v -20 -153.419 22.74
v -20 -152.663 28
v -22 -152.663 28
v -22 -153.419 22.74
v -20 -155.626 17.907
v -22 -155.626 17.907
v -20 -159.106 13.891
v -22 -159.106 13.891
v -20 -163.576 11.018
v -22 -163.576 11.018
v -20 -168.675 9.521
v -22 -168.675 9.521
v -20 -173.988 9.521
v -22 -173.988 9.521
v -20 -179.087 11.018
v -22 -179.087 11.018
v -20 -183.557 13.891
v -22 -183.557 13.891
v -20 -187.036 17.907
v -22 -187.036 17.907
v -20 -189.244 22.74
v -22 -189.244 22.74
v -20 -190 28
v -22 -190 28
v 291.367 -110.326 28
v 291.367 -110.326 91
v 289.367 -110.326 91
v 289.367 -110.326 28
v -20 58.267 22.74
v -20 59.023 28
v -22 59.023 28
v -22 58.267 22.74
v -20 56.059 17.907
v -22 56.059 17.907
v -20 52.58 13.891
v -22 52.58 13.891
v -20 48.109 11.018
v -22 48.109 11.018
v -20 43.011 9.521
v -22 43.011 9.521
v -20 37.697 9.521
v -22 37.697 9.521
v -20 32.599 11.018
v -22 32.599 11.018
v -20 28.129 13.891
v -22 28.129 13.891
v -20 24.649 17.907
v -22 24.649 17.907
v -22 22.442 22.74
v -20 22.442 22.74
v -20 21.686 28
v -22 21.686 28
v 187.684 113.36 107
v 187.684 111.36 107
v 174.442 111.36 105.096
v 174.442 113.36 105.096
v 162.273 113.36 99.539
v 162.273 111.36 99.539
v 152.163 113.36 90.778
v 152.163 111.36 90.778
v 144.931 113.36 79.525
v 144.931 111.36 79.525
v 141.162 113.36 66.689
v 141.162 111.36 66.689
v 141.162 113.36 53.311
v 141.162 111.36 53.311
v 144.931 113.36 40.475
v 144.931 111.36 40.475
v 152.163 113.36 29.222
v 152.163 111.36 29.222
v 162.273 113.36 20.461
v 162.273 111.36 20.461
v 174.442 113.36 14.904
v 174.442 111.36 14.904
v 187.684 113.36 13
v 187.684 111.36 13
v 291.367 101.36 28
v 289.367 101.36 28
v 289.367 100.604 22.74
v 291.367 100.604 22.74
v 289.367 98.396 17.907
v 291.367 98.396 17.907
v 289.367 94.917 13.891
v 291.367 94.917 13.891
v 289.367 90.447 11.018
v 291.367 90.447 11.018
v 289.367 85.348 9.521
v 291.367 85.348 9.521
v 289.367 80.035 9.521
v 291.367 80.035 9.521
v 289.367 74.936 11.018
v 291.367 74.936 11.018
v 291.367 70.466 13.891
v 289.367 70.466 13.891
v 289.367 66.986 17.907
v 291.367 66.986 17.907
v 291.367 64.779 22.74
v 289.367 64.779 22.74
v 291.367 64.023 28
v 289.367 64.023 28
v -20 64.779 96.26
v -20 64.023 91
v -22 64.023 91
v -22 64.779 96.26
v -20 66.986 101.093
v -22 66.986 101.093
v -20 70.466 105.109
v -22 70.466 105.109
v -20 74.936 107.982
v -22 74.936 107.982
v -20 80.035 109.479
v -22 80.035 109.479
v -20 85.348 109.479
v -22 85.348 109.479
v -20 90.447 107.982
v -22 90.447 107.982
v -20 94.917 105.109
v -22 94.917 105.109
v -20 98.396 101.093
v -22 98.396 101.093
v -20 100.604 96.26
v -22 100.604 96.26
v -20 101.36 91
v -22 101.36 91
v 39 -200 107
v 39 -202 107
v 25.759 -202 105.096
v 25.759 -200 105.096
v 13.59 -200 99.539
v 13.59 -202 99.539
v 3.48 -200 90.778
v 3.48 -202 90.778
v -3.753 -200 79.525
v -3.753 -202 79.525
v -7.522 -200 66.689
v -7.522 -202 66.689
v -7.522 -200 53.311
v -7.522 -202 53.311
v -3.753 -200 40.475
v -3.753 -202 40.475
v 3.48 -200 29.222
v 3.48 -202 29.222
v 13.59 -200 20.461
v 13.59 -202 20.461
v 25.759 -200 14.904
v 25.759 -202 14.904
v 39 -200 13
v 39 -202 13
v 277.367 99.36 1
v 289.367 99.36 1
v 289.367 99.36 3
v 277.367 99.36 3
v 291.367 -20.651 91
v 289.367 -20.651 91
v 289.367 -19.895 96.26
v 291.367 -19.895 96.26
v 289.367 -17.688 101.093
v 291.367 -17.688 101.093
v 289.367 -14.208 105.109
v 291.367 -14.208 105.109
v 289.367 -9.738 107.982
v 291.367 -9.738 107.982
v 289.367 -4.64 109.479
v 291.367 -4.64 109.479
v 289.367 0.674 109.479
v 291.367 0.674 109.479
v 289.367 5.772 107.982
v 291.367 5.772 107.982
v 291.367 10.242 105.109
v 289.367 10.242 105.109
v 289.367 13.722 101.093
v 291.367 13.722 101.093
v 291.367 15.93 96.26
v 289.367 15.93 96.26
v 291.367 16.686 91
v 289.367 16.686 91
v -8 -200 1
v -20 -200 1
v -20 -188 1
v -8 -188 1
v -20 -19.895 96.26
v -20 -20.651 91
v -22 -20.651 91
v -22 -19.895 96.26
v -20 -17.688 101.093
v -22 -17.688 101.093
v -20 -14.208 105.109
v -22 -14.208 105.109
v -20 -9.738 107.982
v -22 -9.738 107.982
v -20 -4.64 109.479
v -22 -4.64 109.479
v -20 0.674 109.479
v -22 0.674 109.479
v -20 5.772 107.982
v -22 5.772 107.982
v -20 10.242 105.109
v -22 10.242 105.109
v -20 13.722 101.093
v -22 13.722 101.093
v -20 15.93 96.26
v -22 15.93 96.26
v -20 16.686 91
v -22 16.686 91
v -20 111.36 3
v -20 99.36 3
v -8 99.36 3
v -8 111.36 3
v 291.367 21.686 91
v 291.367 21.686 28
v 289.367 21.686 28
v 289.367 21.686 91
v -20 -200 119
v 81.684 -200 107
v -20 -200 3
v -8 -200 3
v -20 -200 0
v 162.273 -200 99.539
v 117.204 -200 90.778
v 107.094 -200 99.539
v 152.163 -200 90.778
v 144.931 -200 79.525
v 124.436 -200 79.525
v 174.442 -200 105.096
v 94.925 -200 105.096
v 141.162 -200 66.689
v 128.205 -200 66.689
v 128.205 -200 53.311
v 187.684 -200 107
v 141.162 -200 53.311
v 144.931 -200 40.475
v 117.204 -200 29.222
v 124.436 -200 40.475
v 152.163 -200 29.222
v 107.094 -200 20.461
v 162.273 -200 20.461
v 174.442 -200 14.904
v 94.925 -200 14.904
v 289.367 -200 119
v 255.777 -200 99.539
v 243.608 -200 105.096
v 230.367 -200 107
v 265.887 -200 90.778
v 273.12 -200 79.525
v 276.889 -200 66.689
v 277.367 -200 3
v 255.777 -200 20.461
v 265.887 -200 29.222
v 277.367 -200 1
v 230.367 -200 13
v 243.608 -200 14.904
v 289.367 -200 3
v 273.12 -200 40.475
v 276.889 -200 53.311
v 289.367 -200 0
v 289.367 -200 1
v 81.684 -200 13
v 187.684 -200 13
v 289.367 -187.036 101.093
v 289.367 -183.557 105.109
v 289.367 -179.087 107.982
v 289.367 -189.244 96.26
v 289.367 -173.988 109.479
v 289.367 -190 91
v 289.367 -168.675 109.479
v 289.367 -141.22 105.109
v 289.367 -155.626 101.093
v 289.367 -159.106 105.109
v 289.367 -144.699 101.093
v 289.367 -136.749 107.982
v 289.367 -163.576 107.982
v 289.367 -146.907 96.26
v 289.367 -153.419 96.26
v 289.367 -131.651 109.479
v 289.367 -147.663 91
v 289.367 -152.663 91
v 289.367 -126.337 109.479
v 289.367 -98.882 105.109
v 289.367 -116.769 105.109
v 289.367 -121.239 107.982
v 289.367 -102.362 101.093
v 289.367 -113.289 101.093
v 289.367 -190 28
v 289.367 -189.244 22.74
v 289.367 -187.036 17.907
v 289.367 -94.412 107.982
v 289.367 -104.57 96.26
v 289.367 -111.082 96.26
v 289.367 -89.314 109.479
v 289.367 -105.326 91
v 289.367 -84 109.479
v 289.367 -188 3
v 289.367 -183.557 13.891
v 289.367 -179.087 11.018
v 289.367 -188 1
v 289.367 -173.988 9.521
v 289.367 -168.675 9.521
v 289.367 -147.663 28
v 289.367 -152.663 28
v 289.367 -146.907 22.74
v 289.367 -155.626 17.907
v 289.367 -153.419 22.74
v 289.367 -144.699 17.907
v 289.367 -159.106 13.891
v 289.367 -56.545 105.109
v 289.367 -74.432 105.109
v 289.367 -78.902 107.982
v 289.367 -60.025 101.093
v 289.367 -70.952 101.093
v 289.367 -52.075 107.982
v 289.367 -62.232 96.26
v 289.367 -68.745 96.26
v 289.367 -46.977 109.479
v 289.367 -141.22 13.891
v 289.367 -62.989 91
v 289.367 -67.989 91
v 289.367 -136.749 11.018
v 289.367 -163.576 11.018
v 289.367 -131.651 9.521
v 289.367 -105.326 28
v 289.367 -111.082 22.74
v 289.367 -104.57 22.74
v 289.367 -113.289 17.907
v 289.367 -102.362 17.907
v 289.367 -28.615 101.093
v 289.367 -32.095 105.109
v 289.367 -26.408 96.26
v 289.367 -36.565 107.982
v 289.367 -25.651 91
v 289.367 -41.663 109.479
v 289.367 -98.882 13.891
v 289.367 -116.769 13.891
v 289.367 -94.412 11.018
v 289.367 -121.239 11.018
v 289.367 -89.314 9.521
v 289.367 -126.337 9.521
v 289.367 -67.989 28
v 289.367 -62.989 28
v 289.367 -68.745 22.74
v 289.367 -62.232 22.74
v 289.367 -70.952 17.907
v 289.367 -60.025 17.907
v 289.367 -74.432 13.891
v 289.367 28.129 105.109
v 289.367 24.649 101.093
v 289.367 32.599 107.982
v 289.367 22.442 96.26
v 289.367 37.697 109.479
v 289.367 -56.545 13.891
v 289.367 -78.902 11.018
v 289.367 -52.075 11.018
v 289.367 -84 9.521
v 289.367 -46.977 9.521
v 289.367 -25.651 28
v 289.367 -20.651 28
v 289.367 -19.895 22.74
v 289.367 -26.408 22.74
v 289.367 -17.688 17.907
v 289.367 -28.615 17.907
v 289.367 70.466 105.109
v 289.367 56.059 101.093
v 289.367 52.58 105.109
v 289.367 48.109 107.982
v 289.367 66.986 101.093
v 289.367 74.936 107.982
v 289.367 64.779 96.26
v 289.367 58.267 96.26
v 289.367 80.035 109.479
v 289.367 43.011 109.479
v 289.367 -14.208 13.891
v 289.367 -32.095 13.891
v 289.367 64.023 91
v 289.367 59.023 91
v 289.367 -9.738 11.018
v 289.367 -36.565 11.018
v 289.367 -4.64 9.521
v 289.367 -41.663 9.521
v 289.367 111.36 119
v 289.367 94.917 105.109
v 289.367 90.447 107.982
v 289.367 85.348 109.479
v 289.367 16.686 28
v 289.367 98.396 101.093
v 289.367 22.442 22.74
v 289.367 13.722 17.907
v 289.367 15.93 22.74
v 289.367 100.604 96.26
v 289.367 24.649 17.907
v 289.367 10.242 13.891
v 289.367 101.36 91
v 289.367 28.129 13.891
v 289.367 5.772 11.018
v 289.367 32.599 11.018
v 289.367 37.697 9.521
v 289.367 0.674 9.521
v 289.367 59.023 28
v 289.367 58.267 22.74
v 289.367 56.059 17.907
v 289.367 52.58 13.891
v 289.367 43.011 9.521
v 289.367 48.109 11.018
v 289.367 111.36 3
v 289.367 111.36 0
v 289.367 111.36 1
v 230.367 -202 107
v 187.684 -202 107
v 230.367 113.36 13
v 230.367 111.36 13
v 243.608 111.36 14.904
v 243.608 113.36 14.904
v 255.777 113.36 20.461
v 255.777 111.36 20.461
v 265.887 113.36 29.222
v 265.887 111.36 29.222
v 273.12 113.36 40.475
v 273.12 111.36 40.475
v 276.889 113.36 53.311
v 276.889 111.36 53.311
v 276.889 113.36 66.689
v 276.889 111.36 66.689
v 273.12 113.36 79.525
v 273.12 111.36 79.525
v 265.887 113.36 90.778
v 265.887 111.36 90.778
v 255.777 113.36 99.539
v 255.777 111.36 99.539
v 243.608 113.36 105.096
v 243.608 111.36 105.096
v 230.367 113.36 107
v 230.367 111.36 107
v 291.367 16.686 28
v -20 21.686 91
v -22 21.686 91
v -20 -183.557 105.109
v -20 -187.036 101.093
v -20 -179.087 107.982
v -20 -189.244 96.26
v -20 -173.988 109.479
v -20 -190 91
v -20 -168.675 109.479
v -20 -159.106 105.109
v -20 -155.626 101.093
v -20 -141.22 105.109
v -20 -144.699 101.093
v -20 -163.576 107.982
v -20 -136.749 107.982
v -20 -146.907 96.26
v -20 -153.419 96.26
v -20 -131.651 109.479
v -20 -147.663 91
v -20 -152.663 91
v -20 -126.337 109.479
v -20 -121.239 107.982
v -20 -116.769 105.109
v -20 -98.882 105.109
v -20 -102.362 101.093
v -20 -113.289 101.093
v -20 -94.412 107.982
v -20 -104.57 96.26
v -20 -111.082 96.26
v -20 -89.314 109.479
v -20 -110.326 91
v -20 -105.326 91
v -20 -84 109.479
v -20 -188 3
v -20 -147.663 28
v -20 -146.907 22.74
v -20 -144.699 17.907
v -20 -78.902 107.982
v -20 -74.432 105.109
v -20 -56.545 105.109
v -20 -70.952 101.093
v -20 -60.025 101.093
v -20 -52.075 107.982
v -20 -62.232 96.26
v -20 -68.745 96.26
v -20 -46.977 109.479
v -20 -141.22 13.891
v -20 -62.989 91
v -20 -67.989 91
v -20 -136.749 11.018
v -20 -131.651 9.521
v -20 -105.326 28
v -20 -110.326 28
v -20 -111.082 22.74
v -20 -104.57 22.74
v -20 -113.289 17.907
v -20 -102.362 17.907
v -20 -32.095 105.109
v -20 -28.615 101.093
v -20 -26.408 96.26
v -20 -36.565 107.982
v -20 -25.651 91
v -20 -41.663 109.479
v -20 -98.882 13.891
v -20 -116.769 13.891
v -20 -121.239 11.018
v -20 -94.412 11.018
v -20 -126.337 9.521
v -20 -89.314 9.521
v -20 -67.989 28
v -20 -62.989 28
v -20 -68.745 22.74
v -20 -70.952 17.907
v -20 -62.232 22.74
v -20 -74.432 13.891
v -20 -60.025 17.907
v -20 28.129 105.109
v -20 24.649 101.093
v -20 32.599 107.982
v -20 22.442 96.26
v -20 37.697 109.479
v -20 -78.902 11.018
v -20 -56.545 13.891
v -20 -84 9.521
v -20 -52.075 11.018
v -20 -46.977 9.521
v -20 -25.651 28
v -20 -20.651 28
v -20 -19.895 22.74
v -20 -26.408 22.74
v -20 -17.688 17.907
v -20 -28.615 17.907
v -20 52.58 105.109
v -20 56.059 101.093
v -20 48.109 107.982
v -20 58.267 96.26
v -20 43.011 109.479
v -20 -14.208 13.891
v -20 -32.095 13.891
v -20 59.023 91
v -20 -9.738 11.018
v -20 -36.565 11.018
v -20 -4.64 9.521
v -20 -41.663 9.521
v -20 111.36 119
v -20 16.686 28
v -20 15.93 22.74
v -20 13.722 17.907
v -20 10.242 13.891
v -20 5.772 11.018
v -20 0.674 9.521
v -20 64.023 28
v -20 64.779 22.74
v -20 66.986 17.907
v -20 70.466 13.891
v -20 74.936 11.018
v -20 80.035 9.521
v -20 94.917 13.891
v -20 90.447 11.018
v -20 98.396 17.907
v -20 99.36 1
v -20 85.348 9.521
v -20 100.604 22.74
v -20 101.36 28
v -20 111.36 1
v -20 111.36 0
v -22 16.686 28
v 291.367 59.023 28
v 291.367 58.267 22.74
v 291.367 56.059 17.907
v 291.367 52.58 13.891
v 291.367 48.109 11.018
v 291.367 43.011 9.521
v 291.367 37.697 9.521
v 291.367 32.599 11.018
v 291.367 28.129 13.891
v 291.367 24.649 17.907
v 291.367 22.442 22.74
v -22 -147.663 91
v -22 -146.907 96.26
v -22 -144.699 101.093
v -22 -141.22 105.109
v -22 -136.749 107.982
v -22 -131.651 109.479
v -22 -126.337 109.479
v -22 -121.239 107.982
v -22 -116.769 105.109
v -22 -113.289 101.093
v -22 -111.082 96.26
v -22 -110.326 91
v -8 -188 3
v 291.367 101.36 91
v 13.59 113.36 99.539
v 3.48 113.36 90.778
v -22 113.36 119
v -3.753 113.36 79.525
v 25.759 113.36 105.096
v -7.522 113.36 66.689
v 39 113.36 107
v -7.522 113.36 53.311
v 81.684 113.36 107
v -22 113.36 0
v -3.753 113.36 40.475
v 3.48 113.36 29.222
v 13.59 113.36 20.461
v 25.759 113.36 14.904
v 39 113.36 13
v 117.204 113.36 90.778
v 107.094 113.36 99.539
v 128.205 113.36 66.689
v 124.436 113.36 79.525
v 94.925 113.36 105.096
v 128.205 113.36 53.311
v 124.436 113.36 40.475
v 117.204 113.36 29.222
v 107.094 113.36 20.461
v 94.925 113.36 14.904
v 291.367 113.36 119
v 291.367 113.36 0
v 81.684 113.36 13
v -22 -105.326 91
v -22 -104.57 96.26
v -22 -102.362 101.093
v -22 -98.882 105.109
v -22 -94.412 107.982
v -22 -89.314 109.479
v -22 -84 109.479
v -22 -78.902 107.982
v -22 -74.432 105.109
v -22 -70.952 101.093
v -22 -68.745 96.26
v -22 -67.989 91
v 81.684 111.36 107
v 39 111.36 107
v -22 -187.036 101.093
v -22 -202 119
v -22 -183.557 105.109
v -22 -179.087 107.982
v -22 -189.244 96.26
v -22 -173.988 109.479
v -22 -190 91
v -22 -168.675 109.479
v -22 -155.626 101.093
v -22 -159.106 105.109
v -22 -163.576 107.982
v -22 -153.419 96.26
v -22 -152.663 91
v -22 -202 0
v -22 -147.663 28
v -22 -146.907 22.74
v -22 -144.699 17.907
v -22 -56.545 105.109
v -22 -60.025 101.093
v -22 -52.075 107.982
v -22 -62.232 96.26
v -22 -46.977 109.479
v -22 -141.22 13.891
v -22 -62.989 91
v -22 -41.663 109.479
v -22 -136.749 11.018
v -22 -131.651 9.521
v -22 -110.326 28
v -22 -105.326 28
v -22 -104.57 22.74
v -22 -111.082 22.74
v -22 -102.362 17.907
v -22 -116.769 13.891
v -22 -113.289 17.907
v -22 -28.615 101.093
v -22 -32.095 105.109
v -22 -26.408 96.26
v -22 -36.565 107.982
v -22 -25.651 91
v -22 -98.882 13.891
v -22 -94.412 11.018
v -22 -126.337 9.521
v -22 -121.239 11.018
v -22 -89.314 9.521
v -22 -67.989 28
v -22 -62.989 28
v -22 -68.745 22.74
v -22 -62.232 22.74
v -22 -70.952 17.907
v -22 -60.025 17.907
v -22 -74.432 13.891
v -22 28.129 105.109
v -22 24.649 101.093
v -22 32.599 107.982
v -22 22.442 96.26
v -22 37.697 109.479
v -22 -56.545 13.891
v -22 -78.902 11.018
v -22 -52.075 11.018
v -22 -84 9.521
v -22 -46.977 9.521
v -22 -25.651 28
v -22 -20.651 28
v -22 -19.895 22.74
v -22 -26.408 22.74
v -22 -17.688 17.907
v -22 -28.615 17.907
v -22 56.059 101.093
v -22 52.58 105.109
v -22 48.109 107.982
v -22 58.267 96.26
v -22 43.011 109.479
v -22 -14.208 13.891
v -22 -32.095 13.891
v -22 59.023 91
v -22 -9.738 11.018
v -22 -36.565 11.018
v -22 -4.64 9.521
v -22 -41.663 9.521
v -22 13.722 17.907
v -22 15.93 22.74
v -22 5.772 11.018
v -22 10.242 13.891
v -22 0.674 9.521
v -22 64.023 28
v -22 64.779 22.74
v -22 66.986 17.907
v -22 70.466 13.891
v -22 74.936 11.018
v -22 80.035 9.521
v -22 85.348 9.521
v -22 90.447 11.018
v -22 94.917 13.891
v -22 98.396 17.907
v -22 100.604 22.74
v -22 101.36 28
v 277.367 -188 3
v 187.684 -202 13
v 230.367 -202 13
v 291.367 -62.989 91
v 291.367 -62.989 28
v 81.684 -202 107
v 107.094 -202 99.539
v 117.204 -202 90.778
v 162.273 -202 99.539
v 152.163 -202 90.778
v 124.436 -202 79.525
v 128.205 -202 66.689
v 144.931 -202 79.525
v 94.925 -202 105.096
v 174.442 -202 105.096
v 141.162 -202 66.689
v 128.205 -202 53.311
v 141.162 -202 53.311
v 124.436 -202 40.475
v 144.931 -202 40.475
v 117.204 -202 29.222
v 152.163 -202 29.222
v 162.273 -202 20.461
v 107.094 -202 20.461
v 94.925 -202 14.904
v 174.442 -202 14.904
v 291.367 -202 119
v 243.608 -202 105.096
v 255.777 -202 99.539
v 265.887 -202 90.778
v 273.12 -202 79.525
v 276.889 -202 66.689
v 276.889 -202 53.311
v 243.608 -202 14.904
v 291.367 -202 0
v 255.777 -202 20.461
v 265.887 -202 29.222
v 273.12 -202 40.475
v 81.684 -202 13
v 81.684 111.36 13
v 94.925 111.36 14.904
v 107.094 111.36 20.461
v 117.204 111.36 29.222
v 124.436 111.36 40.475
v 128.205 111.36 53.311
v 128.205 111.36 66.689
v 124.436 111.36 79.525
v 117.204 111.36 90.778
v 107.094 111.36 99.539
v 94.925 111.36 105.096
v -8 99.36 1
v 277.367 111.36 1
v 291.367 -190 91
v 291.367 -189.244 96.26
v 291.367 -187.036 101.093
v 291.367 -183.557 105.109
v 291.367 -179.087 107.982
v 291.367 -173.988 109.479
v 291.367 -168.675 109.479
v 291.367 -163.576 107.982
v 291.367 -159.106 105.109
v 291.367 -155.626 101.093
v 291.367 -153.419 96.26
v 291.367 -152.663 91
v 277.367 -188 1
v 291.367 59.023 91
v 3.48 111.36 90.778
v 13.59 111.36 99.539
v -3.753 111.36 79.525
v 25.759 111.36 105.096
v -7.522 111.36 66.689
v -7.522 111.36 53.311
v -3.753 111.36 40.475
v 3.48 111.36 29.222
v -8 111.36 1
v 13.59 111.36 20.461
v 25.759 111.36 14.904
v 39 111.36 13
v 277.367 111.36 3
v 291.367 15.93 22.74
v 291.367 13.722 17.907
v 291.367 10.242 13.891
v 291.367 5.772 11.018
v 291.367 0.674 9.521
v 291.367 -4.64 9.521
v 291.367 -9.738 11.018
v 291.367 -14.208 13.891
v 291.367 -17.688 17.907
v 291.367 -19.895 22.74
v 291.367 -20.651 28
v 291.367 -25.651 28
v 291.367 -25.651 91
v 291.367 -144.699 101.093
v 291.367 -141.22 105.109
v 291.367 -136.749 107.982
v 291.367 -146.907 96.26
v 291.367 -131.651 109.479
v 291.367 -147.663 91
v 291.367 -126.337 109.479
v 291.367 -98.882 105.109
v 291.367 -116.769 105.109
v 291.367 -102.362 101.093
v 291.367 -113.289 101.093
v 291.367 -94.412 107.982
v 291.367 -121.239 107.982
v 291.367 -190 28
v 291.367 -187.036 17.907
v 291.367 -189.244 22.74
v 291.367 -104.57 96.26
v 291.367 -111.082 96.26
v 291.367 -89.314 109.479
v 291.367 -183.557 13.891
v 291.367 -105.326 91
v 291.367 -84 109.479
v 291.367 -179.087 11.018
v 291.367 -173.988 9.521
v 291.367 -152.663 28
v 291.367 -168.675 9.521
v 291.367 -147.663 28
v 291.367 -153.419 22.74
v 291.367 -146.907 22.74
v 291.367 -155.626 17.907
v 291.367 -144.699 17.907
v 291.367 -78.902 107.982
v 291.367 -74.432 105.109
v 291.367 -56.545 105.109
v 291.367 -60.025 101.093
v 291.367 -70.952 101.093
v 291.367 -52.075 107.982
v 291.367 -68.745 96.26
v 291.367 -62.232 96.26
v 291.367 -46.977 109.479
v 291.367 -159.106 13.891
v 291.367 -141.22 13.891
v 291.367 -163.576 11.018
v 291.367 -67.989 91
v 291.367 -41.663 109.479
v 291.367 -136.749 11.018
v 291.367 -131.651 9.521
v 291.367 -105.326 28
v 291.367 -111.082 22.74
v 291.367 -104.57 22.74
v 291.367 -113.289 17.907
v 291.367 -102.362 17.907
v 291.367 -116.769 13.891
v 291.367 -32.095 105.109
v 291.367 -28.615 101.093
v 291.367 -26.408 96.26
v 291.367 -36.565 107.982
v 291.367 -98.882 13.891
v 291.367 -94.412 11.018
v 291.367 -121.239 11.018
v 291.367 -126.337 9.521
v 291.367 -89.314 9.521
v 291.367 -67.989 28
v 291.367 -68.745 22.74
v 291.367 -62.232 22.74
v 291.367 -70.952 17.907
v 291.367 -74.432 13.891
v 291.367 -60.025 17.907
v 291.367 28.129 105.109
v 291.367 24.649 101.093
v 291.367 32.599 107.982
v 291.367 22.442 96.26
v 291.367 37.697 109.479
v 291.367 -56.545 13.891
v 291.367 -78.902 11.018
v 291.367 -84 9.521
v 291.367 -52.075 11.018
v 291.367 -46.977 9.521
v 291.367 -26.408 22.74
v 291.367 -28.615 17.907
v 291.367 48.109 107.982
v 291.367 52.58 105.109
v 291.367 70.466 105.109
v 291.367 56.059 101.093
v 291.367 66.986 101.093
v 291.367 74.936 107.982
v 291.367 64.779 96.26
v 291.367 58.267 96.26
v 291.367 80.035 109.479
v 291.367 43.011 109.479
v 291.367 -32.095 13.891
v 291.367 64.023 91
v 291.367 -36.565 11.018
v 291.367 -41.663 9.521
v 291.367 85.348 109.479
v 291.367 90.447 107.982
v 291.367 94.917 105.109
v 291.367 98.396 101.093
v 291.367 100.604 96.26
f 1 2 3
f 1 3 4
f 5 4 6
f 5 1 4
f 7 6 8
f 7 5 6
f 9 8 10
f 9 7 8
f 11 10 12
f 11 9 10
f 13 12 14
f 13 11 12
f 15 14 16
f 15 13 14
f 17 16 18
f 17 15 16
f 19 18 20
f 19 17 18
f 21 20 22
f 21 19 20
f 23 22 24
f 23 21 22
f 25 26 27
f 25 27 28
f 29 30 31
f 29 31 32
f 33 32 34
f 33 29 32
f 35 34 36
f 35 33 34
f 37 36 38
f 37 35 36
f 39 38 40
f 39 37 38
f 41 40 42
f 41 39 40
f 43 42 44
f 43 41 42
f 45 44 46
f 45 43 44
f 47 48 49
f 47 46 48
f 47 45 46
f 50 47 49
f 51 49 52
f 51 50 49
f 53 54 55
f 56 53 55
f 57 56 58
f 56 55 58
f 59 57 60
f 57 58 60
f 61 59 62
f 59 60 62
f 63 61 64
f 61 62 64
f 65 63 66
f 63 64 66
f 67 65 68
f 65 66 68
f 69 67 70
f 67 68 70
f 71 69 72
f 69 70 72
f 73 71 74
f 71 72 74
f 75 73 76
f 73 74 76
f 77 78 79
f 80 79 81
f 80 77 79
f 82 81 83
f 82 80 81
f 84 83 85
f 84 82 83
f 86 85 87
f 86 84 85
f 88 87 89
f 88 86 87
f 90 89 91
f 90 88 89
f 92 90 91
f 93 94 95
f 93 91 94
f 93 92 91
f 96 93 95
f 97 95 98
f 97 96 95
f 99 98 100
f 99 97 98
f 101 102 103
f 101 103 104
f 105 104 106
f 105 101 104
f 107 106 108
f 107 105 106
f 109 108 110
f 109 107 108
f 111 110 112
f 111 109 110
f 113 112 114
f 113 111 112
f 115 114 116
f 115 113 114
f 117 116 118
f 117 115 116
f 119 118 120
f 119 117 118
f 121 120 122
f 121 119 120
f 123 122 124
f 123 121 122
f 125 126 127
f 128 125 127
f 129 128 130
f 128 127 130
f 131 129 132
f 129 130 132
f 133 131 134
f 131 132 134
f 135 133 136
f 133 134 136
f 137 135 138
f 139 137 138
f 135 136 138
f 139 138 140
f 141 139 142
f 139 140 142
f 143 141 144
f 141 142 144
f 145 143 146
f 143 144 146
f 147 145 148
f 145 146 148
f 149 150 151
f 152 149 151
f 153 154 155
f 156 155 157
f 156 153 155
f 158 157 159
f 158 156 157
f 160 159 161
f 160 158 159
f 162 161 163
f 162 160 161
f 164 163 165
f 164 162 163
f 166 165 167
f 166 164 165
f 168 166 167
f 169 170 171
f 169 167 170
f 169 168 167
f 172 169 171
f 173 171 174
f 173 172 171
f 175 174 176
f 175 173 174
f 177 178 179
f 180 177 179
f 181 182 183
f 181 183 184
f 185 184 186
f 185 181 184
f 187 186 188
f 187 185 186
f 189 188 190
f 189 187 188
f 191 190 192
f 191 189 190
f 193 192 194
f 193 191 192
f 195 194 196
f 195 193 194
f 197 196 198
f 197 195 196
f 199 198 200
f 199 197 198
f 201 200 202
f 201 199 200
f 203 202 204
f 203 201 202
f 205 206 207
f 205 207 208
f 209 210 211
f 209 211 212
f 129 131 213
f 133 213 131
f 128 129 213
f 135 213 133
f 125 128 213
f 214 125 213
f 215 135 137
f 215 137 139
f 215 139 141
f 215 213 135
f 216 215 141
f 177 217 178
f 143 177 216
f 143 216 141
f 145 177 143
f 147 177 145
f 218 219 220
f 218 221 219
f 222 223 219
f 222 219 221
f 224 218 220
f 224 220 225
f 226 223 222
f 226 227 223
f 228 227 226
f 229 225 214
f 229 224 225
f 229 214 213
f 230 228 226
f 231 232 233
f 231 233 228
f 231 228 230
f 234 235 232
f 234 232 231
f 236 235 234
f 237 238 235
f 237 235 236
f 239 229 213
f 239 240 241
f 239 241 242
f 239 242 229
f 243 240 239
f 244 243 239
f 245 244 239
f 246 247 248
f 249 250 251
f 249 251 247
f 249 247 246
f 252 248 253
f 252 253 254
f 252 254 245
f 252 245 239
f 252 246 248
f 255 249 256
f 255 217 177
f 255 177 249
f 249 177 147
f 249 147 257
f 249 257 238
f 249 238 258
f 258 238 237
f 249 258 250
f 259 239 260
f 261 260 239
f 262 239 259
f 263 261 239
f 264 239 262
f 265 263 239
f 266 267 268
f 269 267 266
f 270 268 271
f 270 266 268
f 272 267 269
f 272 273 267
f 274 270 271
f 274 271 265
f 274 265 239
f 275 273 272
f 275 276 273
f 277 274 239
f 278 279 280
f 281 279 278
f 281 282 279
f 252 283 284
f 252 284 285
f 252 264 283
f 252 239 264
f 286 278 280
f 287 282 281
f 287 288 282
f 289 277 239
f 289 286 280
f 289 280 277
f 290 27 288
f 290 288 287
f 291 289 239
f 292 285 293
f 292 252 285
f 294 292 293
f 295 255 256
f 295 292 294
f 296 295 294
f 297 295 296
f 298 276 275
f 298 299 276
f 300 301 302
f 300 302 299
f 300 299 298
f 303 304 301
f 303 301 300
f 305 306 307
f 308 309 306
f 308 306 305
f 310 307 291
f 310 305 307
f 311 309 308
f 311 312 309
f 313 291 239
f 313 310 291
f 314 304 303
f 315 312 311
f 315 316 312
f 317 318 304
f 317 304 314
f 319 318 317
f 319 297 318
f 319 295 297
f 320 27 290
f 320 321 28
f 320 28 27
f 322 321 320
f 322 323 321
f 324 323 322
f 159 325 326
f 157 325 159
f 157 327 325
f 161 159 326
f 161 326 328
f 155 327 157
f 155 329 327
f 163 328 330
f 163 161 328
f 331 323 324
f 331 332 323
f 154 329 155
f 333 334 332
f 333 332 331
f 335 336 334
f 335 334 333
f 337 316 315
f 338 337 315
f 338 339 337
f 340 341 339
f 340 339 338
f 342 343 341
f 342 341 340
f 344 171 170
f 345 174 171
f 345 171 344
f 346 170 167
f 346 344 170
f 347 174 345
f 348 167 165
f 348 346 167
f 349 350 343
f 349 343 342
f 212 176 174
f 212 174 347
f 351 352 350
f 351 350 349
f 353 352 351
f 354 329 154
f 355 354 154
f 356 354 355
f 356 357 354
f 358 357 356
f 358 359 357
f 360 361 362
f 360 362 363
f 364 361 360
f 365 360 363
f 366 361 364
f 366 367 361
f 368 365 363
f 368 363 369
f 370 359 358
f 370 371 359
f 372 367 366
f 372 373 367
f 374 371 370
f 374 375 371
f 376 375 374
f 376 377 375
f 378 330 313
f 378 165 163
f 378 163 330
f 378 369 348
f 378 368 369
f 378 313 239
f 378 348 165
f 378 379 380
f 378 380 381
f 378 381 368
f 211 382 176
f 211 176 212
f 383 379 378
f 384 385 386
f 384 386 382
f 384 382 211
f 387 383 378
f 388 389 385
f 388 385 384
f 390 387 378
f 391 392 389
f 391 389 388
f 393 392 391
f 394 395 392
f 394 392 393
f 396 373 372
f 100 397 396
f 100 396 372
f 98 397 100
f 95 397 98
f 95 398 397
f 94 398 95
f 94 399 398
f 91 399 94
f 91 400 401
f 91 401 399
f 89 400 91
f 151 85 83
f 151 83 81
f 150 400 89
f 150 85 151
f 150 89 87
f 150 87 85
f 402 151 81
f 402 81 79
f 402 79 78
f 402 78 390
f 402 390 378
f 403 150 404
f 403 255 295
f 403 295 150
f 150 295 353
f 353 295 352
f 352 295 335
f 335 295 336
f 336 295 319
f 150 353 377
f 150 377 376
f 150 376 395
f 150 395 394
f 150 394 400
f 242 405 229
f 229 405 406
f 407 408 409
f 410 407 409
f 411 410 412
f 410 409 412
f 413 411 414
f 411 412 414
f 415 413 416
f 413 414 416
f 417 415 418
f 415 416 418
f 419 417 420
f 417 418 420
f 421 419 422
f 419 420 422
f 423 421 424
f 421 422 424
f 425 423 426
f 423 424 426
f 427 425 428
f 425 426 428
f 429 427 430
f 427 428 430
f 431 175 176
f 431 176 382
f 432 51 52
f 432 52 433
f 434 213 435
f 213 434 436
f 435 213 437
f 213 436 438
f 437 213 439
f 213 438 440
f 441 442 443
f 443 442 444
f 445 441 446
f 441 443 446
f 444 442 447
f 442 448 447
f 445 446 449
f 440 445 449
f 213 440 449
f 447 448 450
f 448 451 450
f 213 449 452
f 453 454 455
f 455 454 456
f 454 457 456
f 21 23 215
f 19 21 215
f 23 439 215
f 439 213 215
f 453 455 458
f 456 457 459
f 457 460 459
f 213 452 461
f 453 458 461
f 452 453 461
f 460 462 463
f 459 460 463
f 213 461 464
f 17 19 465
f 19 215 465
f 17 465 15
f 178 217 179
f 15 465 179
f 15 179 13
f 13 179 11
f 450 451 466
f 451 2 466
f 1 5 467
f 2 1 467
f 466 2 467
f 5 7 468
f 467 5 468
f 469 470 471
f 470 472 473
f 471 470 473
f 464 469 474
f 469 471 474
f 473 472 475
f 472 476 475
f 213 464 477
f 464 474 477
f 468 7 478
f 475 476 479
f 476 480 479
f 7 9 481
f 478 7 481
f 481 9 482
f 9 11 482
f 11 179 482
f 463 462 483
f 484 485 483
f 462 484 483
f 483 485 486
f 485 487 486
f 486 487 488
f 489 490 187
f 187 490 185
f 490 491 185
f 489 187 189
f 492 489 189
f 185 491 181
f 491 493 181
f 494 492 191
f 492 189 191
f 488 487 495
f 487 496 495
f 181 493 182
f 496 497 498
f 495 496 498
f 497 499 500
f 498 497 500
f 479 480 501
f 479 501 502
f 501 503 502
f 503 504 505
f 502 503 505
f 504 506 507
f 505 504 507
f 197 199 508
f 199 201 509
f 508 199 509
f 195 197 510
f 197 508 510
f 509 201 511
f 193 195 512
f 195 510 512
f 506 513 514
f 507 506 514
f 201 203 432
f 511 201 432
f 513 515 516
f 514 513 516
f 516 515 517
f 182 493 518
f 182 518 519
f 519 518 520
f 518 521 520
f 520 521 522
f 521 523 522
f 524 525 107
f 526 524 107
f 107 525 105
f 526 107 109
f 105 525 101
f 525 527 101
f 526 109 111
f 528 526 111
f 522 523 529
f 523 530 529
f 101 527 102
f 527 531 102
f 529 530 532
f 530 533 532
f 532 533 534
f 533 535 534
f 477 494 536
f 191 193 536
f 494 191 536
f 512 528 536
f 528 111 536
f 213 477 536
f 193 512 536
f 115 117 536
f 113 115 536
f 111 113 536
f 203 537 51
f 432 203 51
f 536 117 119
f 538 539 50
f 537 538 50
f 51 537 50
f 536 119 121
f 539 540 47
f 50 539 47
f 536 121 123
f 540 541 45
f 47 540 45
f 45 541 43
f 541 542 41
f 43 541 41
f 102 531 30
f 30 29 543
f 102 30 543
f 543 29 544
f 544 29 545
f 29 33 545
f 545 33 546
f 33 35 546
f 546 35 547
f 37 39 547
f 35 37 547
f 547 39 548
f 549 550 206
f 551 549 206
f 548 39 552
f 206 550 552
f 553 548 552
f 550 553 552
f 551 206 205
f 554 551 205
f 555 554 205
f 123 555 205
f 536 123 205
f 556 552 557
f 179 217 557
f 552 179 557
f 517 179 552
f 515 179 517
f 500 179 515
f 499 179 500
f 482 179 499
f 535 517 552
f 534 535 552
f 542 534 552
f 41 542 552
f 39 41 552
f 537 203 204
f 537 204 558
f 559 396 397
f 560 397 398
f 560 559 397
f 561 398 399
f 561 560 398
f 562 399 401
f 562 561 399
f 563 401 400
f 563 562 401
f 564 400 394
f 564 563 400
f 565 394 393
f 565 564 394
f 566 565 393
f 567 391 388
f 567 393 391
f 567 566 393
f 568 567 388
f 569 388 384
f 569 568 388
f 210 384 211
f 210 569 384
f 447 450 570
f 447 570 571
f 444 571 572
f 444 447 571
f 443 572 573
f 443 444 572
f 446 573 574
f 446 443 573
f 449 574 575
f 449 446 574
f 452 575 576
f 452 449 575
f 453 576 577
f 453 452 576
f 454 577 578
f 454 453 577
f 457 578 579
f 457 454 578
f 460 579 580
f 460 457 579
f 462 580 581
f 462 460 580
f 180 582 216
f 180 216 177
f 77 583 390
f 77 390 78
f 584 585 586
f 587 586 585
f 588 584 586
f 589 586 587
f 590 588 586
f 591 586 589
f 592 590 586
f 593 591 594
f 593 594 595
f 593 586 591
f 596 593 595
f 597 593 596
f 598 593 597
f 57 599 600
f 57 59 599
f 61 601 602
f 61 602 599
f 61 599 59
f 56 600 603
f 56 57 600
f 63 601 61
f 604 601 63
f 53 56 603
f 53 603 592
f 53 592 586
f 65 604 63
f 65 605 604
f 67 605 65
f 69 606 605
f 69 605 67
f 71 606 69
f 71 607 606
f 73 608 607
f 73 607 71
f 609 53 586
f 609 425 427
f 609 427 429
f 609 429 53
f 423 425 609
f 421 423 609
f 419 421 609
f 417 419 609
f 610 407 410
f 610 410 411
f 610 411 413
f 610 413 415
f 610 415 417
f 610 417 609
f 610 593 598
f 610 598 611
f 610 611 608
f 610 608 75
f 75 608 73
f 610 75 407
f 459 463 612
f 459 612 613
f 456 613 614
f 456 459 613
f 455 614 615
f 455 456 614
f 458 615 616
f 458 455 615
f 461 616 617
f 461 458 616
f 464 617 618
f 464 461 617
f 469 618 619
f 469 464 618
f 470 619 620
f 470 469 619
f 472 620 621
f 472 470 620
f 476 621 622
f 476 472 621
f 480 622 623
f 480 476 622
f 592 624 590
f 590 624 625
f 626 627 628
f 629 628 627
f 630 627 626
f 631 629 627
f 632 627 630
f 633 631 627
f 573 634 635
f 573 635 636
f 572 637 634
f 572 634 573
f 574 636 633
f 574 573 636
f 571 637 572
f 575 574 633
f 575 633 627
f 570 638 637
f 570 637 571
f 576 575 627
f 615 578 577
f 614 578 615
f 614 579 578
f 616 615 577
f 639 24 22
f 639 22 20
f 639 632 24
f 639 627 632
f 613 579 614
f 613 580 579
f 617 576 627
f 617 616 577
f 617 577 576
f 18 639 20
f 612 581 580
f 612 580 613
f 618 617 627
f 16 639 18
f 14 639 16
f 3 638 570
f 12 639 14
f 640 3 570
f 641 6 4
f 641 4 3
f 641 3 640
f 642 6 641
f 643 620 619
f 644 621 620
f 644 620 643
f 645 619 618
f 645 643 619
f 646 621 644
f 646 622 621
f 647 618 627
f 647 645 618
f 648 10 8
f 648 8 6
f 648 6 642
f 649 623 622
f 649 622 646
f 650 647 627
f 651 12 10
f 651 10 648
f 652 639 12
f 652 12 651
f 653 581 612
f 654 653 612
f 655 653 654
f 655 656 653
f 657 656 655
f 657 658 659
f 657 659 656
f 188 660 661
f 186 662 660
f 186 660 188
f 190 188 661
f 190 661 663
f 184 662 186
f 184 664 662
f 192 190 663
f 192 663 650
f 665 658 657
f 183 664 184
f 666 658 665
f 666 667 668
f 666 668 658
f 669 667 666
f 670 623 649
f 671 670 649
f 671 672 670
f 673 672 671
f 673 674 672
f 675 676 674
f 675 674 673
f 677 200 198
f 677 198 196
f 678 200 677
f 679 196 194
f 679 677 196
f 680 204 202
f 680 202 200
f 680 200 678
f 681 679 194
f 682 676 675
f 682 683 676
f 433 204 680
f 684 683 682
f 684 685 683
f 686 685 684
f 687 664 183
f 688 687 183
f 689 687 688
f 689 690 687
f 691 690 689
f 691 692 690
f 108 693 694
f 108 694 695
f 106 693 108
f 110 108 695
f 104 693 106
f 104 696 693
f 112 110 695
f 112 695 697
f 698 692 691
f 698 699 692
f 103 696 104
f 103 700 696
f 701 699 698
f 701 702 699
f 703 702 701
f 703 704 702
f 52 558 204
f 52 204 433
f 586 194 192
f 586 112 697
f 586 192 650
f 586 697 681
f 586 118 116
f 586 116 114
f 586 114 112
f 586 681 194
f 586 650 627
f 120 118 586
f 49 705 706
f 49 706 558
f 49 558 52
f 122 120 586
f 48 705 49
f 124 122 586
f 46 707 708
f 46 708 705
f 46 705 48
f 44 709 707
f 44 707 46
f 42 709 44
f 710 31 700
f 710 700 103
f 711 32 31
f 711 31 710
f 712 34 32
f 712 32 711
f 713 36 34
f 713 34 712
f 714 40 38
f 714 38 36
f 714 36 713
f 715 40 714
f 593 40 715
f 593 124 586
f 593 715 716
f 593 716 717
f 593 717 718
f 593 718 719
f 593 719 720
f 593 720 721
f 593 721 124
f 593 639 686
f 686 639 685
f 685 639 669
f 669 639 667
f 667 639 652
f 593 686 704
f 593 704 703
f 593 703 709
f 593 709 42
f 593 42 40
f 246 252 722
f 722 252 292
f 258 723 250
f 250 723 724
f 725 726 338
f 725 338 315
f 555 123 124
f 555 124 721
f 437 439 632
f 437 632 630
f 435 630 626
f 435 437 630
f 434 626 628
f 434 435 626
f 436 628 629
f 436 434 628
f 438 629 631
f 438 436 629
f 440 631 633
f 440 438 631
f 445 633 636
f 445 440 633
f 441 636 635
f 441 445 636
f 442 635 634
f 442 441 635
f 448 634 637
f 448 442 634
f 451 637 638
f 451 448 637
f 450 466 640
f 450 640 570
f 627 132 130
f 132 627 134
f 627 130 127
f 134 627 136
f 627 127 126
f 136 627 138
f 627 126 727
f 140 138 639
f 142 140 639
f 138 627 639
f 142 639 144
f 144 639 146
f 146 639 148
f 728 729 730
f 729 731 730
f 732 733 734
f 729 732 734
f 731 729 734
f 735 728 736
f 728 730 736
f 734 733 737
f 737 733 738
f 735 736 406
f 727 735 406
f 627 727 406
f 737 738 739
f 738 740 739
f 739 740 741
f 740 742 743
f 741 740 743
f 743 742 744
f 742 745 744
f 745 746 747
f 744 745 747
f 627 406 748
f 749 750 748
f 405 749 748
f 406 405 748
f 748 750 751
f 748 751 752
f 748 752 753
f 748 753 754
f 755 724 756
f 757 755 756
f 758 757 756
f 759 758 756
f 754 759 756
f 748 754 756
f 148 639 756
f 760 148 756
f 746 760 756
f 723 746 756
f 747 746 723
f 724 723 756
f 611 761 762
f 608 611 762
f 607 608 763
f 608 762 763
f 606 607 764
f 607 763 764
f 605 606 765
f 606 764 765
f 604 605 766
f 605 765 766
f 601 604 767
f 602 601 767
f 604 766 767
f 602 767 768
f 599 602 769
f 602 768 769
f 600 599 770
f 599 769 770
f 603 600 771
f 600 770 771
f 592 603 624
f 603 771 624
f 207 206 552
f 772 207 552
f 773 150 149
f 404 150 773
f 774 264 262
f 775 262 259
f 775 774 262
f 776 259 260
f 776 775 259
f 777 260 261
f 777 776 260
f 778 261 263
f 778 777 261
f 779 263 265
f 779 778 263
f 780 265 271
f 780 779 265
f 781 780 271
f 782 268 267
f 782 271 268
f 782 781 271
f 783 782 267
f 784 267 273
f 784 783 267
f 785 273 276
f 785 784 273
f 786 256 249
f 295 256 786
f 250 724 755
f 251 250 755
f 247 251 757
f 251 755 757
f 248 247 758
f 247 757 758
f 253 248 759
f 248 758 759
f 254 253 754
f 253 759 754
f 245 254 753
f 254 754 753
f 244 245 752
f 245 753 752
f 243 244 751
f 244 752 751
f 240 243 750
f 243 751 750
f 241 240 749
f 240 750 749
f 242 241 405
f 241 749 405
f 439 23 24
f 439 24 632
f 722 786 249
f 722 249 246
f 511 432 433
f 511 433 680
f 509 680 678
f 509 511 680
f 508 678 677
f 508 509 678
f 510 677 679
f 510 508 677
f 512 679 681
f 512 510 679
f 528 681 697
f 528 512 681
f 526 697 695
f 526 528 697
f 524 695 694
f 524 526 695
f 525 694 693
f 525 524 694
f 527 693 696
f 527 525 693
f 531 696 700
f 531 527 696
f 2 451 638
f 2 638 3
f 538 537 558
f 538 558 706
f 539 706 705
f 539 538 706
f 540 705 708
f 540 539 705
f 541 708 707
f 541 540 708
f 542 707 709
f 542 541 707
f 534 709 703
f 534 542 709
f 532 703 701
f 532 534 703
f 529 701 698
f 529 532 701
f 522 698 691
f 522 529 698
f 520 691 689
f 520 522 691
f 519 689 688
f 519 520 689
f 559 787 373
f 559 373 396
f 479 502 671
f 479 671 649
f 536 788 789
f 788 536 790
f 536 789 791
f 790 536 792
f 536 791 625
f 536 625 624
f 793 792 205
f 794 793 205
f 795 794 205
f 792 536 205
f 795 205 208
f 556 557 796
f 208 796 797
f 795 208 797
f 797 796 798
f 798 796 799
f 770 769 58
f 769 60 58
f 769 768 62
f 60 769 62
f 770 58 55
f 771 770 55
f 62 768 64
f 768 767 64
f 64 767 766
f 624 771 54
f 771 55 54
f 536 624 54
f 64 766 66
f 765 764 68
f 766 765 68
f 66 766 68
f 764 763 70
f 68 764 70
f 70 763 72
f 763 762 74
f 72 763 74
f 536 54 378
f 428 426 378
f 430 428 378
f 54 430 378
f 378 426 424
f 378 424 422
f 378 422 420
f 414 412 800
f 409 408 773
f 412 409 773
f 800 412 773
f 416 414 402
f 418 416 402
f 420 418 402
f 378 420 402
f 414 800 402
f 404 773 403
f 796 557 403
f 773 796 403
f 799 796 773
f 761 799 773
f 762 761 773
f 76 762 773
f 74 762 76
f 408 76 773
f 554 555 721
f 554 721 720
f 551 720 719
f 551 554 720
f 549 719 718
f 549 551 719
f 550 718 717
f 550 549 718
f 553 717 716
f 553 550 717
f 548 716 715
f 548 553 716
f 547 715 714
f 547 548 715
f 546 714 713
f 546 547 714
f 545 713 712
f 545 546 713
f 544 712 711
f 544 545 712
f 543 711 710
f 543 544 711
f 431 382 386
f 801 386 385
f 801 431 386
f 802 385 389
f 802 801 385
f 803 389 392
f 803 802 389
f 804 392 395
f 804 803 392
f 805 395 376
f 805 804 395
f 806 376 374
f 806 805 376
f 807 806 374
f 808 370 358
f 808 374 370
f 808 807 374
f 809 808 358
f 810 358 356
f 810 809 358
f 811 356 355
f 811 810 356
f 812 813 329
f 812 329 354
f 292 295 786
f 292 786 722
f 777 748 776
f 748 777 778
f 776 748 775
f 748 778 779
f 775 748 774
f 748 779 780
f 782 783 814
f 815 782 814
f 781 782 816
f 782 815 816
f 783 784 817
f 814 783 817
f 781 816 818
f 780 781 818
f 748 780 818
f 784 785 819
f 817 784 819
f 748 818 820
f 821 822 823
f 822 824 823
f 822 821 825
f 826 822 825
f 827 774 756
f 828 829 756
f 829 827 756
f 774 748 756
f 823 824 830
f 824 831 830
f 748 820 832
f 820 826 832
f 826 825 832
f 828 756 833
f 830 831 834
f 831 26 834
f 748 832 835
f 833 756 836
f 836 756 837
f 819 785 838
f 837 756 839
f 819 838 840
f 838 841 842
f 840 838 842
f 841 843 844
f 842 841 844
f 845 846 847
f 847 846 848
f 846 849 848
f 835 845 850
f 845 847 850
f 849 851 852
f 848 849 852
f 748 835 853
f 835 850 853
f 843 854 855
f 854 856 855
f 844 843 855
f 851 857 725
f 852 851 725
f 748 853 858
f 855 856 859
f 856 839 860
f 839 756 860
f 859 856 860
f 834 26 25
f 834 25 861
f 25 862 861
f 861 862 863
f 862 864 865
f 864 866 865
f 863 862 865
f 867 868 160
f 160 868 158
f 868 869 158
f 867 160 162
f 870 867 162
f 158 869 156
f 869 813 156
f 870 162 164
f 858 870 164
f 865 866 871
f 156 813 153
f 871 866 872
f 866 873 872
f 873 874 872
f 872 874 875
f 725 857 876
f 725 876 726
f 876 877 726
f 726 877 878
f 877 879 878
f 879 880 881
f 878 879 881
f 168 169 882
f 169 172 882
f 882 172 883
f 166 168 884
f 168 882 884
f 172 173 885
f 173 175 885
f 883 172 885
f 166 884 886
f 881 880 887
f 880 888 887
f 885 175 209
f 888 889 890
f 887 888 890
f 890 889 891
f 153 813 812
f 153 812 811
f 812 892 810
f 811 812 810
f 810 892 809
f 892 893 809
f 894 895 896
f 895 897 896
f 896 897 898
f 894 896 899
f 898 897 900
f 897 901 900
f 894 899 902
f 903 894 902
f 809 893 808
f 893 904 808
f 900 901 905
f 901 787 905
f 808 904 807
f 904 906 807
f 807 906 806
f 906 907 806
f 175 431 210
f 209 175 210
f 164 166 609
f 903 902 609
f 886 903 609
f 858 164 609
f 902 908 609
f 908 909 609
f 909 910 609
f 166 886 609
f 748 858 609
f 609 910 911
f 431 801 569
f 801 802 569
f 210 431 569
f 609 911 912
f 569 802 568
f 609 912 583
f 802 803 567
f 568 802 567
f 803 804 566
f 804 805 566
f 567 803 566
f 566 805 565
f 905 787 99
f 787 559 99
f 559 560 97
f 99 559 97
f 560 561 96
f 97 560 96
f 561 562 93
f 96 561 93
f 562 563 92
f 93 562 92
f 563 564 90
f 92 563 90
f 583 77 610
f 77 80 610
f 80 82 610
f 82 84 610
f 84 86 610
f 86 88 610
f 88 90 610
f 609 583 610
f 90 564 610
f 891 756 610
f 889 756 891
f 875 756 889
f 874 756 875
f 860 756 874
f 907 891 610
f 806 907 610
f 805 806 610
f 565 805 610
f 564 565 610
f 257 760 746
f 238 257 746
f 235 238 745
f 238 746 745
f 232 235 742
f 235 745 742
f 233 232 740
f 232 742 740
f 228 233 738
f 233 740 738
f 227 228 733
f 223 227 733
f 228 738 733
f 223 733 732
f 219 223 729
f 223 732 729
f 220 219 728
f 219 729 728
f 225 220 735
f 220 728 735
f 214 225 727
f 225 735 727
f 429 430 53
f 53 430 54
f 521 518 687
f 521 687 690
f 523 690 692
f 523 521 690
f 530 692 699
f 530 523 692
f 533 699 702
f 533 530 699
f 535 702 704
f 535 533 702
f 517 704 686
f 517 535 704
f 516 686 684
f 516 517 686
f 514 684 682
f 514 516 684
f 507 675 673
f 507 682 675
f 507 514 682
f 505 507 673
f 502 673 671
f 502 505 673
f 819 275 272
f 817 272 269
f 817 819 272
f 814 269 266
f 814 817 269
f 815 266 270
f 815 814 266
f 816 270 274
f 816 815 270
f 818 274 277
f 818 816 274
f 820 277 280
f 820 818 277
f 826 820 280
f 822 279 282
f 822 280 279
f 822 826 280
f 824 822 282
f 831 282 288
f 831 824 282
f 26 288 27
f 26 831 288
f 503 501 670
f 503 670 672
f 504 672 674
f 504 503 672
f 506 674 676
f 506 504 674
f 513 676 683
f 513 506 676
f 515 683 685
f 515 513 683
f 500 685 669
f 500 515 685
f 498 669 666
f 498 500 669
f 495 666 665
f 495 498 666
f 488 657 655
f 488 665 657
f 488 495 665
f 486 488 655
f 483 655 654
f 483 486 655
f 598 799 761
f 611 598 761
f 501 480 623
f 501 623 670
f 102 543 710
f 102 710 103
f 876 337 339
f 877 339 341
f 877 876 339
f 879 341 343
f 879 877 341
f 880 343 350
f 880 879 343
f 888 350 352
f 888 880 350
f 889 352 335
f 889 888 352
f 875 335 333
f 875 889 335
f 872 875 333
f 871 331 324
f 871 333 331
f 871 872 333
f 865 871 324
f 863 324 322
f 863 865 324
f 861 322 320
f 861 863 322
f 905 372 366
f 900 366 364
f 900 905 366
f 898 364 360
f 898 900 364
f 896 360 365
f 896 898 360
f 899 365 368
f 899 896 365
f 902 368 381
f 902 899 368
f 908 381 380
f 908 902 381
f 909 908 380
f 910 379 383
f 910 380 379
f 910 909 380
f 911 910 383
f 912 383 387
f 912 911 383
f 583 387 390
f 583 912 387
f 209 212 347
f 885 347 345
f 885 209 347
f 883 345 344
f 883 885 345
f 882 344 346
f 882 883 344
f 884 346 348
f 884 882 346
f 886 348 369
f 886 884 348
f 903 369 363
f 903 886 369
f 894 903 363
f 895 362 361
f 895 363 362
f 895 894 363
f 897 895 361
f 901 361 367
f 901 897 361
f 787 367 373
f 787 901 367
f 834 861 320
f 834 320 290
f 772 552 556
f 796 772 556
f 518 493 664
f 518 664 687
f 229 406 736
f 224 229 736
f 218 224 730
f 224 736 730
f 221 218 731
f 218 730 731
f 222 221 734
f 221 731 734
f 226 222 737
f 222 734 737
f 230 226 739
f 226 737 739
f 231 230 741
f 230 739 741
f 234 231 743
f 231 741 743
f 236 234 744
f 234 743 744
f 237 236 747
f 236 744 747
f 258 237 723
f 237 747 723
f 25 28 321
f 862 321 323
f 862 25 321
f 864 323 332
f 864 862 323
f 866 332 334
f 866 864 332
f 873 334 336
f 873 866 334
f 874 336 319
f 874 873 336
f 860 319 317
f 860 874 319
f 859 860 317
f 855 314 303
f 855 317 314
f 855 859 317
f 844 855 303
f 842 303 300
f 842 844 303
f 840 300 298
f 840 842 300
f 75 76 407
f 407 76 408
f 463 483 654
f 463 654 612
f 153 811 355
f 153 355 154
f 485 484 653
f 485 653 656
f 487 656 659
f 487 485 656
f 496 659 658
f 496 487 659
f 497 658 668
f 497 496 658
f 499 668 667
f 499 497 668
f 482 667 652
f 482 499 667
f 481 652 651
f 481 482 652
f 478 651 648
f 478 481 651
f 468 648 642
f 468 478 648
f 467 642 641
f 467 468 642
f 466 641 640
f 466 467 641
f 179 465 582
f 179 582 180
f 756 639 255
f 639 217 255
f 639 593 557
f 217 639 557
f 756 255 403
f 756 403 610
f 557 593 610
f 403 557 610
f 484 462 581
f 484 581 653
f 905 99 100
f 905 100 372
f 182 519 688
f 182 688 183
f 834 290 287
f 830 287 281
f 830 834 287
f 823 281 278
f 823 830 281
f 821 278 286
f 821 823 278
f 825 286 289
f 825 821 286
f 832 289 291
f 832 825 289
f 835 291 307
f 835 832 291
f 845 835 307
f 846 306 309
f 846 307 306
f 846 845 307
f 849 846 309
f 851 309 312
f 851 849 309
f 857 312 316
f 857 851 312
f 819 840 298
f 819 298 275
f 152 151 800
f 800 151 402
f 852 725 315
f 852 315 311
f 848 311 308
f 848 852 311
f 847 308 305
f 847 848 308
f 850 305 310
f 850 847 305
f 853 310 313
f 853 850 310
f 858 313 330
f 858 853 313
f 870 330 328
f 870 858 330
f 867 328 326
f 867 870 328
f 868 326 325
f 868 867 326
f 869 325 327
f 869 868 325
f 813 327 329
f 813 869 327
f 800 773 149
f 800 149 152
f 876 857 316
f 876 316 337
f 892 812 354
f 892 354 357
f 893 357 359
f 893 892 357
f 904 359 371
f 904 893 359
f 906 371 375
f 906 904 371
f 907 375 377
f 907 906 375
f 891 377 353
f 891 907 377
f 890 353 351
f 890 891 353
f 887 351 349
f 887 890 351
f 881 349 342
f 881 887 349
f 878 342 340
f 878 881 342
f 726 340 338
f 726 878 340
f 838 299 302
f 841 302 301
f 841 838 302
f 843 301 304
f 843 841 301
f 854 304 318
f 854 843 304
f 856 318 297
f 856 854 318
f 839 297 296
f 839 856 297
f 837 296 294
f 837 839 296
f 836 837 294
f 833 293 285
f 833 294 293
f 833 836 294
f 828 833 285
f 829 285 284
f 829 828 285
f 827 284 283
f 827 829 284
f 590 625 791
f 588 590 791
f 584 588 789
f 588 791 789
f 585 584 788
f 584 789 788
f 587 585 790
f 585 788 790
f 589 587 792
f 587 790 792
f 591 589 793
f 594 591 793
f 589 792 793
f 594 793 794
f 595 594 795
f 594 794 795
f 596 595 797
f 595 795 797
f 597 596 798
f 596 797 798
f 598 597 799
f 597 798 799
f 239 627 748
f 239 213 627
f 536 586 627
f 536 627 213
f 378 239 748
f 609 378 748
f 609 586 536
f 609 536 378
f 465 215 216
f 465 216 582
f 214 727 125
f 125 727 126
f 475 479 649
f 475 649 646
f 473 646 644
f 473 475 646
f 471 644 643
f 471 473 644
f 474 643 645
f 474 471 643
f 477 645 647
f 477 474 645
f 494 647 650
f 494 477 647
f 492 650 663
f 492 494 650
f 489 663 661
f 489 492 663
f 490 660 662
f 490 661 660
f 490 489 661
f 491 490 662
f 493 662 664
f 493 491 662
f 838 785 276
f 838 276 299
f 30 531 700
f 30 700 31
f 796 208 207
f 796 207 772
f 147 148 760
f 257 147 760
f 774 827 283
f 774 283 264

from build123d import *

# Parameters (mm, degrees)
SKETCH1_W               = 313.367
SKETCH1_H               = 315.36
SKETCH1_W_2             = 309.367
SKETCH1_H_2             = 311.36
EXTRUDE_THIN1_DEPTH     = 119
CUT_EXTRUDE1_DEPTH      = 445.128605574
CUT_EXTRUDE1_DEPTH_BACK = 445.128605574
SKETCH3_W               = 2
SKETCH3_H               = 12
BOSS_EXTRUDE1_DEPTH     = 12
SKETCH4_W               = 2
SKETCH4_H               = 12
BOSS_EXTRUDE2_DEPTH     = 12
SKETCH5_W               = 2
SKETCH5_H               = 12
BOSS_EXTRUDE3_DEPTH     = 12
SKETCH6_W               = 2
SKETCH6_H               = 12
BOSS_EXTRUDE4_DEPTH     = 12
CUT_EXTRUDE2_DEPTH      = 392.361567721


with BuildPart() as part:
    # Sketch1 → Extrude-Thin1 (new body)
    with BuildSketch(Plane.XY):
        with Locations((134.6835, -44.32)):
            Rectangle(SKETCH1_W, SKETCH1_H)
        with Locations((134.6835, -44.32)):
            Rectangle(SKETCH1_W_2, SKETCH1_H_2, mode=Mode.SUBTRACT)
    extrude(amount=EXTRUDE_THIN1_DEPTH)

    # Sketch2 → Cut-Extrude1 (cut, two sides: drawn at the far end of the back side and taken through both)
    with BuildSketch(Plane(origin=(0, -200, 0), x_dir=(1, 0, 0), z_dir=(0, 1, 0)).offset(-CUT_EXTRUDE1_DEPTH_BACK)):
        with BuildLine():
            Line((39, -13), (81.6835, -13))
            ThreePointArc((81.6835, -13), (128.6835, -60), (81.6835, -107))
            Line((81.6835, -107), (39, -107))
            ThreePointArc((39, -107), (-8, -60), (39, -13))
        make_face()
        with BuildLine():
            Line((187.6835, -13), (230.367, -13))
            ThreePointArc((230.367, -13), (277.367, -60), (230.367, -107))
            Line((230.367, -107), (187.6835, -107))
            ThreePointArc((187.6835, -107), (140.6835, -60), (187.6835, -13))
        make_face()
    extrude(amount=CUT_EXTRUDE1_DEPTH + CUT_EXTRUDE1_DEPTH_BACK, mode=Mode.SUBTRACT)

    # Sketch3 → Boss-Extrude1 (add)
    with BuildSketch(Plane(origin=(-20, 0, 0), x_dir=(0, 0, -1), z_dir=(1, 0, 0))):
        with Locations((-2, -194)):
            Rectangle(SKETCH3_W, SKETCH3_H)
    extrude(amount=BOSS_EXTRUDE1_DEPTH)

    # Sketch4 → Boss-Extrude2 (add)
    with BuildSketch(Plane(origin=(-20, 0, 0), x_dir=(0, 0, -1), z_dir=(1, 0, 0))):
        with Locations((-2, 105.36)):
            Rectangle(SKETCH4_W, SKETCH4_H)
    extrude(amount=BOSS_EXTRUDE2_DEPTH)

    # Sketch5 → Boss-Extrude3 (add)
    with BuildSketch(Plane.ZY.offset(-289.367)):
        with Locations((2, 105.36)):
            Rectangle(SKETCH5_W, SKETCH5_H)
    extrude(amount=BOSS_EXTRUDE3_DEPTH)

    # Sketch6 → Boss-Extrude4 (add)
    with BuildSketch(Plane.ZY.offset(-289.367)):
        with Locations((2, -194)):
            Rectangle(SKETCH6_W, SKETCH6_H)
    extrude(amount=BOSS_EXTRUDE4_DEPTH)

    # Sketch7 → Cut-Extrude2 (cut, through all)
    with BuildSketch(Plane(origin=(291.367, 0, 0), x_dir=(0, 0, -1), z_dir=(1, 0, 0))):
        with BuildLine():
            Line((-91, 101.36), (-28, 101.36))
            ThreePointArc((-28, 101.36), (-9.331428571, 82.691428571), (-28, 64.022857143))
            Line((-28, 64.022857143), (-91, 64.022857143))
            ThreePointArc((-91, 64.022857143), (-109.668571429, 82.691428571), (-91, 101.36))
        make_face()
        with BuildLine():
            Line((-91, 59.022857143), (-28, 59.022857143))
            ThreePointArc((-28, 59.022857143), (-9.331428571, 40.354285714), (-28, 21.685714286))
            Line((-28, 21.685714286), (-91, 21.685714286))
            ThreePointArc((-91, 21.685714286), (-109.668571429, 40.354285714), (-91, 59.022857143))
        make_face()
        with BuildLine():
            Line((-91, 16.685714286), (-28, 16.685714286))
            ThreePointArc((-28, 16.685714286), (-9.331428571, -1.982857143), (-28, -20.651428571))
            Line((-28, -20.651428571), (-91, -20.651428571))
            ThreePointArc((-91, -20.651428571), (-109.668571429, -1.982857143), (-91, 16.685714286))
        make_face()
        with BuildLine():
            Line((-91, -25.651428571), (-28, -25.651428571))
            ThreePointArc((-28, -25.651428571), (-9.331428571, -44.32), (-28, -62.988571429))
            Line((-28, -62.988571429), (-91, -62.988571429))
            ThreePointArc((-91, -62.988571429), (-109.668571429, -44.32), (-91, -25.651428571))
        make_face()
        with BuildLine():
            Line((-91, -67.988571429), (-28, -67.988571429))
            ThreePointArc((-28, -67.988571429), (-9.331428571, -86.657142857), (-28, -105.325714286))
            Line((-28, -105.325714286), (-91, -105.325714286))
            ThreePointArc((-91, -105.325714286), (-109.668571429, -86.657142857), (-91, -67.988571429))
        make_face()
        with BuildLine():
            Line((-91, -110.325714286), (-28, -110.325714286))
            ThreePointArc((-28, -110.325714286), (-9.331428571, -128.994285714), (-28, -147.662857143))
            Line((-28, -147.662857143), (-91, -147.662857143))
            ThreePointArc((-91, -147.662857143), (-109.668571429, -128.994285714), (-91, -110.325714286))
        make_face()
        with BuildLine():
            Line((-91, -152.662857143), (-28, -152.662857143))
            ThreePointArc((-28, -152.662857143), (-9.331428571, -171.331428571), (-28, -190))
            Line((-28, -190), (-91, -190))
            ThreePointArc((-91, -190), (-109.668571429, -171.331428571), (-91, -152.662857143))
        make_face()
    extrude(amount=-CUT_EXTRUDE2_DEPTH, mode=Mode.SUBTRACT)


solid = part.part
